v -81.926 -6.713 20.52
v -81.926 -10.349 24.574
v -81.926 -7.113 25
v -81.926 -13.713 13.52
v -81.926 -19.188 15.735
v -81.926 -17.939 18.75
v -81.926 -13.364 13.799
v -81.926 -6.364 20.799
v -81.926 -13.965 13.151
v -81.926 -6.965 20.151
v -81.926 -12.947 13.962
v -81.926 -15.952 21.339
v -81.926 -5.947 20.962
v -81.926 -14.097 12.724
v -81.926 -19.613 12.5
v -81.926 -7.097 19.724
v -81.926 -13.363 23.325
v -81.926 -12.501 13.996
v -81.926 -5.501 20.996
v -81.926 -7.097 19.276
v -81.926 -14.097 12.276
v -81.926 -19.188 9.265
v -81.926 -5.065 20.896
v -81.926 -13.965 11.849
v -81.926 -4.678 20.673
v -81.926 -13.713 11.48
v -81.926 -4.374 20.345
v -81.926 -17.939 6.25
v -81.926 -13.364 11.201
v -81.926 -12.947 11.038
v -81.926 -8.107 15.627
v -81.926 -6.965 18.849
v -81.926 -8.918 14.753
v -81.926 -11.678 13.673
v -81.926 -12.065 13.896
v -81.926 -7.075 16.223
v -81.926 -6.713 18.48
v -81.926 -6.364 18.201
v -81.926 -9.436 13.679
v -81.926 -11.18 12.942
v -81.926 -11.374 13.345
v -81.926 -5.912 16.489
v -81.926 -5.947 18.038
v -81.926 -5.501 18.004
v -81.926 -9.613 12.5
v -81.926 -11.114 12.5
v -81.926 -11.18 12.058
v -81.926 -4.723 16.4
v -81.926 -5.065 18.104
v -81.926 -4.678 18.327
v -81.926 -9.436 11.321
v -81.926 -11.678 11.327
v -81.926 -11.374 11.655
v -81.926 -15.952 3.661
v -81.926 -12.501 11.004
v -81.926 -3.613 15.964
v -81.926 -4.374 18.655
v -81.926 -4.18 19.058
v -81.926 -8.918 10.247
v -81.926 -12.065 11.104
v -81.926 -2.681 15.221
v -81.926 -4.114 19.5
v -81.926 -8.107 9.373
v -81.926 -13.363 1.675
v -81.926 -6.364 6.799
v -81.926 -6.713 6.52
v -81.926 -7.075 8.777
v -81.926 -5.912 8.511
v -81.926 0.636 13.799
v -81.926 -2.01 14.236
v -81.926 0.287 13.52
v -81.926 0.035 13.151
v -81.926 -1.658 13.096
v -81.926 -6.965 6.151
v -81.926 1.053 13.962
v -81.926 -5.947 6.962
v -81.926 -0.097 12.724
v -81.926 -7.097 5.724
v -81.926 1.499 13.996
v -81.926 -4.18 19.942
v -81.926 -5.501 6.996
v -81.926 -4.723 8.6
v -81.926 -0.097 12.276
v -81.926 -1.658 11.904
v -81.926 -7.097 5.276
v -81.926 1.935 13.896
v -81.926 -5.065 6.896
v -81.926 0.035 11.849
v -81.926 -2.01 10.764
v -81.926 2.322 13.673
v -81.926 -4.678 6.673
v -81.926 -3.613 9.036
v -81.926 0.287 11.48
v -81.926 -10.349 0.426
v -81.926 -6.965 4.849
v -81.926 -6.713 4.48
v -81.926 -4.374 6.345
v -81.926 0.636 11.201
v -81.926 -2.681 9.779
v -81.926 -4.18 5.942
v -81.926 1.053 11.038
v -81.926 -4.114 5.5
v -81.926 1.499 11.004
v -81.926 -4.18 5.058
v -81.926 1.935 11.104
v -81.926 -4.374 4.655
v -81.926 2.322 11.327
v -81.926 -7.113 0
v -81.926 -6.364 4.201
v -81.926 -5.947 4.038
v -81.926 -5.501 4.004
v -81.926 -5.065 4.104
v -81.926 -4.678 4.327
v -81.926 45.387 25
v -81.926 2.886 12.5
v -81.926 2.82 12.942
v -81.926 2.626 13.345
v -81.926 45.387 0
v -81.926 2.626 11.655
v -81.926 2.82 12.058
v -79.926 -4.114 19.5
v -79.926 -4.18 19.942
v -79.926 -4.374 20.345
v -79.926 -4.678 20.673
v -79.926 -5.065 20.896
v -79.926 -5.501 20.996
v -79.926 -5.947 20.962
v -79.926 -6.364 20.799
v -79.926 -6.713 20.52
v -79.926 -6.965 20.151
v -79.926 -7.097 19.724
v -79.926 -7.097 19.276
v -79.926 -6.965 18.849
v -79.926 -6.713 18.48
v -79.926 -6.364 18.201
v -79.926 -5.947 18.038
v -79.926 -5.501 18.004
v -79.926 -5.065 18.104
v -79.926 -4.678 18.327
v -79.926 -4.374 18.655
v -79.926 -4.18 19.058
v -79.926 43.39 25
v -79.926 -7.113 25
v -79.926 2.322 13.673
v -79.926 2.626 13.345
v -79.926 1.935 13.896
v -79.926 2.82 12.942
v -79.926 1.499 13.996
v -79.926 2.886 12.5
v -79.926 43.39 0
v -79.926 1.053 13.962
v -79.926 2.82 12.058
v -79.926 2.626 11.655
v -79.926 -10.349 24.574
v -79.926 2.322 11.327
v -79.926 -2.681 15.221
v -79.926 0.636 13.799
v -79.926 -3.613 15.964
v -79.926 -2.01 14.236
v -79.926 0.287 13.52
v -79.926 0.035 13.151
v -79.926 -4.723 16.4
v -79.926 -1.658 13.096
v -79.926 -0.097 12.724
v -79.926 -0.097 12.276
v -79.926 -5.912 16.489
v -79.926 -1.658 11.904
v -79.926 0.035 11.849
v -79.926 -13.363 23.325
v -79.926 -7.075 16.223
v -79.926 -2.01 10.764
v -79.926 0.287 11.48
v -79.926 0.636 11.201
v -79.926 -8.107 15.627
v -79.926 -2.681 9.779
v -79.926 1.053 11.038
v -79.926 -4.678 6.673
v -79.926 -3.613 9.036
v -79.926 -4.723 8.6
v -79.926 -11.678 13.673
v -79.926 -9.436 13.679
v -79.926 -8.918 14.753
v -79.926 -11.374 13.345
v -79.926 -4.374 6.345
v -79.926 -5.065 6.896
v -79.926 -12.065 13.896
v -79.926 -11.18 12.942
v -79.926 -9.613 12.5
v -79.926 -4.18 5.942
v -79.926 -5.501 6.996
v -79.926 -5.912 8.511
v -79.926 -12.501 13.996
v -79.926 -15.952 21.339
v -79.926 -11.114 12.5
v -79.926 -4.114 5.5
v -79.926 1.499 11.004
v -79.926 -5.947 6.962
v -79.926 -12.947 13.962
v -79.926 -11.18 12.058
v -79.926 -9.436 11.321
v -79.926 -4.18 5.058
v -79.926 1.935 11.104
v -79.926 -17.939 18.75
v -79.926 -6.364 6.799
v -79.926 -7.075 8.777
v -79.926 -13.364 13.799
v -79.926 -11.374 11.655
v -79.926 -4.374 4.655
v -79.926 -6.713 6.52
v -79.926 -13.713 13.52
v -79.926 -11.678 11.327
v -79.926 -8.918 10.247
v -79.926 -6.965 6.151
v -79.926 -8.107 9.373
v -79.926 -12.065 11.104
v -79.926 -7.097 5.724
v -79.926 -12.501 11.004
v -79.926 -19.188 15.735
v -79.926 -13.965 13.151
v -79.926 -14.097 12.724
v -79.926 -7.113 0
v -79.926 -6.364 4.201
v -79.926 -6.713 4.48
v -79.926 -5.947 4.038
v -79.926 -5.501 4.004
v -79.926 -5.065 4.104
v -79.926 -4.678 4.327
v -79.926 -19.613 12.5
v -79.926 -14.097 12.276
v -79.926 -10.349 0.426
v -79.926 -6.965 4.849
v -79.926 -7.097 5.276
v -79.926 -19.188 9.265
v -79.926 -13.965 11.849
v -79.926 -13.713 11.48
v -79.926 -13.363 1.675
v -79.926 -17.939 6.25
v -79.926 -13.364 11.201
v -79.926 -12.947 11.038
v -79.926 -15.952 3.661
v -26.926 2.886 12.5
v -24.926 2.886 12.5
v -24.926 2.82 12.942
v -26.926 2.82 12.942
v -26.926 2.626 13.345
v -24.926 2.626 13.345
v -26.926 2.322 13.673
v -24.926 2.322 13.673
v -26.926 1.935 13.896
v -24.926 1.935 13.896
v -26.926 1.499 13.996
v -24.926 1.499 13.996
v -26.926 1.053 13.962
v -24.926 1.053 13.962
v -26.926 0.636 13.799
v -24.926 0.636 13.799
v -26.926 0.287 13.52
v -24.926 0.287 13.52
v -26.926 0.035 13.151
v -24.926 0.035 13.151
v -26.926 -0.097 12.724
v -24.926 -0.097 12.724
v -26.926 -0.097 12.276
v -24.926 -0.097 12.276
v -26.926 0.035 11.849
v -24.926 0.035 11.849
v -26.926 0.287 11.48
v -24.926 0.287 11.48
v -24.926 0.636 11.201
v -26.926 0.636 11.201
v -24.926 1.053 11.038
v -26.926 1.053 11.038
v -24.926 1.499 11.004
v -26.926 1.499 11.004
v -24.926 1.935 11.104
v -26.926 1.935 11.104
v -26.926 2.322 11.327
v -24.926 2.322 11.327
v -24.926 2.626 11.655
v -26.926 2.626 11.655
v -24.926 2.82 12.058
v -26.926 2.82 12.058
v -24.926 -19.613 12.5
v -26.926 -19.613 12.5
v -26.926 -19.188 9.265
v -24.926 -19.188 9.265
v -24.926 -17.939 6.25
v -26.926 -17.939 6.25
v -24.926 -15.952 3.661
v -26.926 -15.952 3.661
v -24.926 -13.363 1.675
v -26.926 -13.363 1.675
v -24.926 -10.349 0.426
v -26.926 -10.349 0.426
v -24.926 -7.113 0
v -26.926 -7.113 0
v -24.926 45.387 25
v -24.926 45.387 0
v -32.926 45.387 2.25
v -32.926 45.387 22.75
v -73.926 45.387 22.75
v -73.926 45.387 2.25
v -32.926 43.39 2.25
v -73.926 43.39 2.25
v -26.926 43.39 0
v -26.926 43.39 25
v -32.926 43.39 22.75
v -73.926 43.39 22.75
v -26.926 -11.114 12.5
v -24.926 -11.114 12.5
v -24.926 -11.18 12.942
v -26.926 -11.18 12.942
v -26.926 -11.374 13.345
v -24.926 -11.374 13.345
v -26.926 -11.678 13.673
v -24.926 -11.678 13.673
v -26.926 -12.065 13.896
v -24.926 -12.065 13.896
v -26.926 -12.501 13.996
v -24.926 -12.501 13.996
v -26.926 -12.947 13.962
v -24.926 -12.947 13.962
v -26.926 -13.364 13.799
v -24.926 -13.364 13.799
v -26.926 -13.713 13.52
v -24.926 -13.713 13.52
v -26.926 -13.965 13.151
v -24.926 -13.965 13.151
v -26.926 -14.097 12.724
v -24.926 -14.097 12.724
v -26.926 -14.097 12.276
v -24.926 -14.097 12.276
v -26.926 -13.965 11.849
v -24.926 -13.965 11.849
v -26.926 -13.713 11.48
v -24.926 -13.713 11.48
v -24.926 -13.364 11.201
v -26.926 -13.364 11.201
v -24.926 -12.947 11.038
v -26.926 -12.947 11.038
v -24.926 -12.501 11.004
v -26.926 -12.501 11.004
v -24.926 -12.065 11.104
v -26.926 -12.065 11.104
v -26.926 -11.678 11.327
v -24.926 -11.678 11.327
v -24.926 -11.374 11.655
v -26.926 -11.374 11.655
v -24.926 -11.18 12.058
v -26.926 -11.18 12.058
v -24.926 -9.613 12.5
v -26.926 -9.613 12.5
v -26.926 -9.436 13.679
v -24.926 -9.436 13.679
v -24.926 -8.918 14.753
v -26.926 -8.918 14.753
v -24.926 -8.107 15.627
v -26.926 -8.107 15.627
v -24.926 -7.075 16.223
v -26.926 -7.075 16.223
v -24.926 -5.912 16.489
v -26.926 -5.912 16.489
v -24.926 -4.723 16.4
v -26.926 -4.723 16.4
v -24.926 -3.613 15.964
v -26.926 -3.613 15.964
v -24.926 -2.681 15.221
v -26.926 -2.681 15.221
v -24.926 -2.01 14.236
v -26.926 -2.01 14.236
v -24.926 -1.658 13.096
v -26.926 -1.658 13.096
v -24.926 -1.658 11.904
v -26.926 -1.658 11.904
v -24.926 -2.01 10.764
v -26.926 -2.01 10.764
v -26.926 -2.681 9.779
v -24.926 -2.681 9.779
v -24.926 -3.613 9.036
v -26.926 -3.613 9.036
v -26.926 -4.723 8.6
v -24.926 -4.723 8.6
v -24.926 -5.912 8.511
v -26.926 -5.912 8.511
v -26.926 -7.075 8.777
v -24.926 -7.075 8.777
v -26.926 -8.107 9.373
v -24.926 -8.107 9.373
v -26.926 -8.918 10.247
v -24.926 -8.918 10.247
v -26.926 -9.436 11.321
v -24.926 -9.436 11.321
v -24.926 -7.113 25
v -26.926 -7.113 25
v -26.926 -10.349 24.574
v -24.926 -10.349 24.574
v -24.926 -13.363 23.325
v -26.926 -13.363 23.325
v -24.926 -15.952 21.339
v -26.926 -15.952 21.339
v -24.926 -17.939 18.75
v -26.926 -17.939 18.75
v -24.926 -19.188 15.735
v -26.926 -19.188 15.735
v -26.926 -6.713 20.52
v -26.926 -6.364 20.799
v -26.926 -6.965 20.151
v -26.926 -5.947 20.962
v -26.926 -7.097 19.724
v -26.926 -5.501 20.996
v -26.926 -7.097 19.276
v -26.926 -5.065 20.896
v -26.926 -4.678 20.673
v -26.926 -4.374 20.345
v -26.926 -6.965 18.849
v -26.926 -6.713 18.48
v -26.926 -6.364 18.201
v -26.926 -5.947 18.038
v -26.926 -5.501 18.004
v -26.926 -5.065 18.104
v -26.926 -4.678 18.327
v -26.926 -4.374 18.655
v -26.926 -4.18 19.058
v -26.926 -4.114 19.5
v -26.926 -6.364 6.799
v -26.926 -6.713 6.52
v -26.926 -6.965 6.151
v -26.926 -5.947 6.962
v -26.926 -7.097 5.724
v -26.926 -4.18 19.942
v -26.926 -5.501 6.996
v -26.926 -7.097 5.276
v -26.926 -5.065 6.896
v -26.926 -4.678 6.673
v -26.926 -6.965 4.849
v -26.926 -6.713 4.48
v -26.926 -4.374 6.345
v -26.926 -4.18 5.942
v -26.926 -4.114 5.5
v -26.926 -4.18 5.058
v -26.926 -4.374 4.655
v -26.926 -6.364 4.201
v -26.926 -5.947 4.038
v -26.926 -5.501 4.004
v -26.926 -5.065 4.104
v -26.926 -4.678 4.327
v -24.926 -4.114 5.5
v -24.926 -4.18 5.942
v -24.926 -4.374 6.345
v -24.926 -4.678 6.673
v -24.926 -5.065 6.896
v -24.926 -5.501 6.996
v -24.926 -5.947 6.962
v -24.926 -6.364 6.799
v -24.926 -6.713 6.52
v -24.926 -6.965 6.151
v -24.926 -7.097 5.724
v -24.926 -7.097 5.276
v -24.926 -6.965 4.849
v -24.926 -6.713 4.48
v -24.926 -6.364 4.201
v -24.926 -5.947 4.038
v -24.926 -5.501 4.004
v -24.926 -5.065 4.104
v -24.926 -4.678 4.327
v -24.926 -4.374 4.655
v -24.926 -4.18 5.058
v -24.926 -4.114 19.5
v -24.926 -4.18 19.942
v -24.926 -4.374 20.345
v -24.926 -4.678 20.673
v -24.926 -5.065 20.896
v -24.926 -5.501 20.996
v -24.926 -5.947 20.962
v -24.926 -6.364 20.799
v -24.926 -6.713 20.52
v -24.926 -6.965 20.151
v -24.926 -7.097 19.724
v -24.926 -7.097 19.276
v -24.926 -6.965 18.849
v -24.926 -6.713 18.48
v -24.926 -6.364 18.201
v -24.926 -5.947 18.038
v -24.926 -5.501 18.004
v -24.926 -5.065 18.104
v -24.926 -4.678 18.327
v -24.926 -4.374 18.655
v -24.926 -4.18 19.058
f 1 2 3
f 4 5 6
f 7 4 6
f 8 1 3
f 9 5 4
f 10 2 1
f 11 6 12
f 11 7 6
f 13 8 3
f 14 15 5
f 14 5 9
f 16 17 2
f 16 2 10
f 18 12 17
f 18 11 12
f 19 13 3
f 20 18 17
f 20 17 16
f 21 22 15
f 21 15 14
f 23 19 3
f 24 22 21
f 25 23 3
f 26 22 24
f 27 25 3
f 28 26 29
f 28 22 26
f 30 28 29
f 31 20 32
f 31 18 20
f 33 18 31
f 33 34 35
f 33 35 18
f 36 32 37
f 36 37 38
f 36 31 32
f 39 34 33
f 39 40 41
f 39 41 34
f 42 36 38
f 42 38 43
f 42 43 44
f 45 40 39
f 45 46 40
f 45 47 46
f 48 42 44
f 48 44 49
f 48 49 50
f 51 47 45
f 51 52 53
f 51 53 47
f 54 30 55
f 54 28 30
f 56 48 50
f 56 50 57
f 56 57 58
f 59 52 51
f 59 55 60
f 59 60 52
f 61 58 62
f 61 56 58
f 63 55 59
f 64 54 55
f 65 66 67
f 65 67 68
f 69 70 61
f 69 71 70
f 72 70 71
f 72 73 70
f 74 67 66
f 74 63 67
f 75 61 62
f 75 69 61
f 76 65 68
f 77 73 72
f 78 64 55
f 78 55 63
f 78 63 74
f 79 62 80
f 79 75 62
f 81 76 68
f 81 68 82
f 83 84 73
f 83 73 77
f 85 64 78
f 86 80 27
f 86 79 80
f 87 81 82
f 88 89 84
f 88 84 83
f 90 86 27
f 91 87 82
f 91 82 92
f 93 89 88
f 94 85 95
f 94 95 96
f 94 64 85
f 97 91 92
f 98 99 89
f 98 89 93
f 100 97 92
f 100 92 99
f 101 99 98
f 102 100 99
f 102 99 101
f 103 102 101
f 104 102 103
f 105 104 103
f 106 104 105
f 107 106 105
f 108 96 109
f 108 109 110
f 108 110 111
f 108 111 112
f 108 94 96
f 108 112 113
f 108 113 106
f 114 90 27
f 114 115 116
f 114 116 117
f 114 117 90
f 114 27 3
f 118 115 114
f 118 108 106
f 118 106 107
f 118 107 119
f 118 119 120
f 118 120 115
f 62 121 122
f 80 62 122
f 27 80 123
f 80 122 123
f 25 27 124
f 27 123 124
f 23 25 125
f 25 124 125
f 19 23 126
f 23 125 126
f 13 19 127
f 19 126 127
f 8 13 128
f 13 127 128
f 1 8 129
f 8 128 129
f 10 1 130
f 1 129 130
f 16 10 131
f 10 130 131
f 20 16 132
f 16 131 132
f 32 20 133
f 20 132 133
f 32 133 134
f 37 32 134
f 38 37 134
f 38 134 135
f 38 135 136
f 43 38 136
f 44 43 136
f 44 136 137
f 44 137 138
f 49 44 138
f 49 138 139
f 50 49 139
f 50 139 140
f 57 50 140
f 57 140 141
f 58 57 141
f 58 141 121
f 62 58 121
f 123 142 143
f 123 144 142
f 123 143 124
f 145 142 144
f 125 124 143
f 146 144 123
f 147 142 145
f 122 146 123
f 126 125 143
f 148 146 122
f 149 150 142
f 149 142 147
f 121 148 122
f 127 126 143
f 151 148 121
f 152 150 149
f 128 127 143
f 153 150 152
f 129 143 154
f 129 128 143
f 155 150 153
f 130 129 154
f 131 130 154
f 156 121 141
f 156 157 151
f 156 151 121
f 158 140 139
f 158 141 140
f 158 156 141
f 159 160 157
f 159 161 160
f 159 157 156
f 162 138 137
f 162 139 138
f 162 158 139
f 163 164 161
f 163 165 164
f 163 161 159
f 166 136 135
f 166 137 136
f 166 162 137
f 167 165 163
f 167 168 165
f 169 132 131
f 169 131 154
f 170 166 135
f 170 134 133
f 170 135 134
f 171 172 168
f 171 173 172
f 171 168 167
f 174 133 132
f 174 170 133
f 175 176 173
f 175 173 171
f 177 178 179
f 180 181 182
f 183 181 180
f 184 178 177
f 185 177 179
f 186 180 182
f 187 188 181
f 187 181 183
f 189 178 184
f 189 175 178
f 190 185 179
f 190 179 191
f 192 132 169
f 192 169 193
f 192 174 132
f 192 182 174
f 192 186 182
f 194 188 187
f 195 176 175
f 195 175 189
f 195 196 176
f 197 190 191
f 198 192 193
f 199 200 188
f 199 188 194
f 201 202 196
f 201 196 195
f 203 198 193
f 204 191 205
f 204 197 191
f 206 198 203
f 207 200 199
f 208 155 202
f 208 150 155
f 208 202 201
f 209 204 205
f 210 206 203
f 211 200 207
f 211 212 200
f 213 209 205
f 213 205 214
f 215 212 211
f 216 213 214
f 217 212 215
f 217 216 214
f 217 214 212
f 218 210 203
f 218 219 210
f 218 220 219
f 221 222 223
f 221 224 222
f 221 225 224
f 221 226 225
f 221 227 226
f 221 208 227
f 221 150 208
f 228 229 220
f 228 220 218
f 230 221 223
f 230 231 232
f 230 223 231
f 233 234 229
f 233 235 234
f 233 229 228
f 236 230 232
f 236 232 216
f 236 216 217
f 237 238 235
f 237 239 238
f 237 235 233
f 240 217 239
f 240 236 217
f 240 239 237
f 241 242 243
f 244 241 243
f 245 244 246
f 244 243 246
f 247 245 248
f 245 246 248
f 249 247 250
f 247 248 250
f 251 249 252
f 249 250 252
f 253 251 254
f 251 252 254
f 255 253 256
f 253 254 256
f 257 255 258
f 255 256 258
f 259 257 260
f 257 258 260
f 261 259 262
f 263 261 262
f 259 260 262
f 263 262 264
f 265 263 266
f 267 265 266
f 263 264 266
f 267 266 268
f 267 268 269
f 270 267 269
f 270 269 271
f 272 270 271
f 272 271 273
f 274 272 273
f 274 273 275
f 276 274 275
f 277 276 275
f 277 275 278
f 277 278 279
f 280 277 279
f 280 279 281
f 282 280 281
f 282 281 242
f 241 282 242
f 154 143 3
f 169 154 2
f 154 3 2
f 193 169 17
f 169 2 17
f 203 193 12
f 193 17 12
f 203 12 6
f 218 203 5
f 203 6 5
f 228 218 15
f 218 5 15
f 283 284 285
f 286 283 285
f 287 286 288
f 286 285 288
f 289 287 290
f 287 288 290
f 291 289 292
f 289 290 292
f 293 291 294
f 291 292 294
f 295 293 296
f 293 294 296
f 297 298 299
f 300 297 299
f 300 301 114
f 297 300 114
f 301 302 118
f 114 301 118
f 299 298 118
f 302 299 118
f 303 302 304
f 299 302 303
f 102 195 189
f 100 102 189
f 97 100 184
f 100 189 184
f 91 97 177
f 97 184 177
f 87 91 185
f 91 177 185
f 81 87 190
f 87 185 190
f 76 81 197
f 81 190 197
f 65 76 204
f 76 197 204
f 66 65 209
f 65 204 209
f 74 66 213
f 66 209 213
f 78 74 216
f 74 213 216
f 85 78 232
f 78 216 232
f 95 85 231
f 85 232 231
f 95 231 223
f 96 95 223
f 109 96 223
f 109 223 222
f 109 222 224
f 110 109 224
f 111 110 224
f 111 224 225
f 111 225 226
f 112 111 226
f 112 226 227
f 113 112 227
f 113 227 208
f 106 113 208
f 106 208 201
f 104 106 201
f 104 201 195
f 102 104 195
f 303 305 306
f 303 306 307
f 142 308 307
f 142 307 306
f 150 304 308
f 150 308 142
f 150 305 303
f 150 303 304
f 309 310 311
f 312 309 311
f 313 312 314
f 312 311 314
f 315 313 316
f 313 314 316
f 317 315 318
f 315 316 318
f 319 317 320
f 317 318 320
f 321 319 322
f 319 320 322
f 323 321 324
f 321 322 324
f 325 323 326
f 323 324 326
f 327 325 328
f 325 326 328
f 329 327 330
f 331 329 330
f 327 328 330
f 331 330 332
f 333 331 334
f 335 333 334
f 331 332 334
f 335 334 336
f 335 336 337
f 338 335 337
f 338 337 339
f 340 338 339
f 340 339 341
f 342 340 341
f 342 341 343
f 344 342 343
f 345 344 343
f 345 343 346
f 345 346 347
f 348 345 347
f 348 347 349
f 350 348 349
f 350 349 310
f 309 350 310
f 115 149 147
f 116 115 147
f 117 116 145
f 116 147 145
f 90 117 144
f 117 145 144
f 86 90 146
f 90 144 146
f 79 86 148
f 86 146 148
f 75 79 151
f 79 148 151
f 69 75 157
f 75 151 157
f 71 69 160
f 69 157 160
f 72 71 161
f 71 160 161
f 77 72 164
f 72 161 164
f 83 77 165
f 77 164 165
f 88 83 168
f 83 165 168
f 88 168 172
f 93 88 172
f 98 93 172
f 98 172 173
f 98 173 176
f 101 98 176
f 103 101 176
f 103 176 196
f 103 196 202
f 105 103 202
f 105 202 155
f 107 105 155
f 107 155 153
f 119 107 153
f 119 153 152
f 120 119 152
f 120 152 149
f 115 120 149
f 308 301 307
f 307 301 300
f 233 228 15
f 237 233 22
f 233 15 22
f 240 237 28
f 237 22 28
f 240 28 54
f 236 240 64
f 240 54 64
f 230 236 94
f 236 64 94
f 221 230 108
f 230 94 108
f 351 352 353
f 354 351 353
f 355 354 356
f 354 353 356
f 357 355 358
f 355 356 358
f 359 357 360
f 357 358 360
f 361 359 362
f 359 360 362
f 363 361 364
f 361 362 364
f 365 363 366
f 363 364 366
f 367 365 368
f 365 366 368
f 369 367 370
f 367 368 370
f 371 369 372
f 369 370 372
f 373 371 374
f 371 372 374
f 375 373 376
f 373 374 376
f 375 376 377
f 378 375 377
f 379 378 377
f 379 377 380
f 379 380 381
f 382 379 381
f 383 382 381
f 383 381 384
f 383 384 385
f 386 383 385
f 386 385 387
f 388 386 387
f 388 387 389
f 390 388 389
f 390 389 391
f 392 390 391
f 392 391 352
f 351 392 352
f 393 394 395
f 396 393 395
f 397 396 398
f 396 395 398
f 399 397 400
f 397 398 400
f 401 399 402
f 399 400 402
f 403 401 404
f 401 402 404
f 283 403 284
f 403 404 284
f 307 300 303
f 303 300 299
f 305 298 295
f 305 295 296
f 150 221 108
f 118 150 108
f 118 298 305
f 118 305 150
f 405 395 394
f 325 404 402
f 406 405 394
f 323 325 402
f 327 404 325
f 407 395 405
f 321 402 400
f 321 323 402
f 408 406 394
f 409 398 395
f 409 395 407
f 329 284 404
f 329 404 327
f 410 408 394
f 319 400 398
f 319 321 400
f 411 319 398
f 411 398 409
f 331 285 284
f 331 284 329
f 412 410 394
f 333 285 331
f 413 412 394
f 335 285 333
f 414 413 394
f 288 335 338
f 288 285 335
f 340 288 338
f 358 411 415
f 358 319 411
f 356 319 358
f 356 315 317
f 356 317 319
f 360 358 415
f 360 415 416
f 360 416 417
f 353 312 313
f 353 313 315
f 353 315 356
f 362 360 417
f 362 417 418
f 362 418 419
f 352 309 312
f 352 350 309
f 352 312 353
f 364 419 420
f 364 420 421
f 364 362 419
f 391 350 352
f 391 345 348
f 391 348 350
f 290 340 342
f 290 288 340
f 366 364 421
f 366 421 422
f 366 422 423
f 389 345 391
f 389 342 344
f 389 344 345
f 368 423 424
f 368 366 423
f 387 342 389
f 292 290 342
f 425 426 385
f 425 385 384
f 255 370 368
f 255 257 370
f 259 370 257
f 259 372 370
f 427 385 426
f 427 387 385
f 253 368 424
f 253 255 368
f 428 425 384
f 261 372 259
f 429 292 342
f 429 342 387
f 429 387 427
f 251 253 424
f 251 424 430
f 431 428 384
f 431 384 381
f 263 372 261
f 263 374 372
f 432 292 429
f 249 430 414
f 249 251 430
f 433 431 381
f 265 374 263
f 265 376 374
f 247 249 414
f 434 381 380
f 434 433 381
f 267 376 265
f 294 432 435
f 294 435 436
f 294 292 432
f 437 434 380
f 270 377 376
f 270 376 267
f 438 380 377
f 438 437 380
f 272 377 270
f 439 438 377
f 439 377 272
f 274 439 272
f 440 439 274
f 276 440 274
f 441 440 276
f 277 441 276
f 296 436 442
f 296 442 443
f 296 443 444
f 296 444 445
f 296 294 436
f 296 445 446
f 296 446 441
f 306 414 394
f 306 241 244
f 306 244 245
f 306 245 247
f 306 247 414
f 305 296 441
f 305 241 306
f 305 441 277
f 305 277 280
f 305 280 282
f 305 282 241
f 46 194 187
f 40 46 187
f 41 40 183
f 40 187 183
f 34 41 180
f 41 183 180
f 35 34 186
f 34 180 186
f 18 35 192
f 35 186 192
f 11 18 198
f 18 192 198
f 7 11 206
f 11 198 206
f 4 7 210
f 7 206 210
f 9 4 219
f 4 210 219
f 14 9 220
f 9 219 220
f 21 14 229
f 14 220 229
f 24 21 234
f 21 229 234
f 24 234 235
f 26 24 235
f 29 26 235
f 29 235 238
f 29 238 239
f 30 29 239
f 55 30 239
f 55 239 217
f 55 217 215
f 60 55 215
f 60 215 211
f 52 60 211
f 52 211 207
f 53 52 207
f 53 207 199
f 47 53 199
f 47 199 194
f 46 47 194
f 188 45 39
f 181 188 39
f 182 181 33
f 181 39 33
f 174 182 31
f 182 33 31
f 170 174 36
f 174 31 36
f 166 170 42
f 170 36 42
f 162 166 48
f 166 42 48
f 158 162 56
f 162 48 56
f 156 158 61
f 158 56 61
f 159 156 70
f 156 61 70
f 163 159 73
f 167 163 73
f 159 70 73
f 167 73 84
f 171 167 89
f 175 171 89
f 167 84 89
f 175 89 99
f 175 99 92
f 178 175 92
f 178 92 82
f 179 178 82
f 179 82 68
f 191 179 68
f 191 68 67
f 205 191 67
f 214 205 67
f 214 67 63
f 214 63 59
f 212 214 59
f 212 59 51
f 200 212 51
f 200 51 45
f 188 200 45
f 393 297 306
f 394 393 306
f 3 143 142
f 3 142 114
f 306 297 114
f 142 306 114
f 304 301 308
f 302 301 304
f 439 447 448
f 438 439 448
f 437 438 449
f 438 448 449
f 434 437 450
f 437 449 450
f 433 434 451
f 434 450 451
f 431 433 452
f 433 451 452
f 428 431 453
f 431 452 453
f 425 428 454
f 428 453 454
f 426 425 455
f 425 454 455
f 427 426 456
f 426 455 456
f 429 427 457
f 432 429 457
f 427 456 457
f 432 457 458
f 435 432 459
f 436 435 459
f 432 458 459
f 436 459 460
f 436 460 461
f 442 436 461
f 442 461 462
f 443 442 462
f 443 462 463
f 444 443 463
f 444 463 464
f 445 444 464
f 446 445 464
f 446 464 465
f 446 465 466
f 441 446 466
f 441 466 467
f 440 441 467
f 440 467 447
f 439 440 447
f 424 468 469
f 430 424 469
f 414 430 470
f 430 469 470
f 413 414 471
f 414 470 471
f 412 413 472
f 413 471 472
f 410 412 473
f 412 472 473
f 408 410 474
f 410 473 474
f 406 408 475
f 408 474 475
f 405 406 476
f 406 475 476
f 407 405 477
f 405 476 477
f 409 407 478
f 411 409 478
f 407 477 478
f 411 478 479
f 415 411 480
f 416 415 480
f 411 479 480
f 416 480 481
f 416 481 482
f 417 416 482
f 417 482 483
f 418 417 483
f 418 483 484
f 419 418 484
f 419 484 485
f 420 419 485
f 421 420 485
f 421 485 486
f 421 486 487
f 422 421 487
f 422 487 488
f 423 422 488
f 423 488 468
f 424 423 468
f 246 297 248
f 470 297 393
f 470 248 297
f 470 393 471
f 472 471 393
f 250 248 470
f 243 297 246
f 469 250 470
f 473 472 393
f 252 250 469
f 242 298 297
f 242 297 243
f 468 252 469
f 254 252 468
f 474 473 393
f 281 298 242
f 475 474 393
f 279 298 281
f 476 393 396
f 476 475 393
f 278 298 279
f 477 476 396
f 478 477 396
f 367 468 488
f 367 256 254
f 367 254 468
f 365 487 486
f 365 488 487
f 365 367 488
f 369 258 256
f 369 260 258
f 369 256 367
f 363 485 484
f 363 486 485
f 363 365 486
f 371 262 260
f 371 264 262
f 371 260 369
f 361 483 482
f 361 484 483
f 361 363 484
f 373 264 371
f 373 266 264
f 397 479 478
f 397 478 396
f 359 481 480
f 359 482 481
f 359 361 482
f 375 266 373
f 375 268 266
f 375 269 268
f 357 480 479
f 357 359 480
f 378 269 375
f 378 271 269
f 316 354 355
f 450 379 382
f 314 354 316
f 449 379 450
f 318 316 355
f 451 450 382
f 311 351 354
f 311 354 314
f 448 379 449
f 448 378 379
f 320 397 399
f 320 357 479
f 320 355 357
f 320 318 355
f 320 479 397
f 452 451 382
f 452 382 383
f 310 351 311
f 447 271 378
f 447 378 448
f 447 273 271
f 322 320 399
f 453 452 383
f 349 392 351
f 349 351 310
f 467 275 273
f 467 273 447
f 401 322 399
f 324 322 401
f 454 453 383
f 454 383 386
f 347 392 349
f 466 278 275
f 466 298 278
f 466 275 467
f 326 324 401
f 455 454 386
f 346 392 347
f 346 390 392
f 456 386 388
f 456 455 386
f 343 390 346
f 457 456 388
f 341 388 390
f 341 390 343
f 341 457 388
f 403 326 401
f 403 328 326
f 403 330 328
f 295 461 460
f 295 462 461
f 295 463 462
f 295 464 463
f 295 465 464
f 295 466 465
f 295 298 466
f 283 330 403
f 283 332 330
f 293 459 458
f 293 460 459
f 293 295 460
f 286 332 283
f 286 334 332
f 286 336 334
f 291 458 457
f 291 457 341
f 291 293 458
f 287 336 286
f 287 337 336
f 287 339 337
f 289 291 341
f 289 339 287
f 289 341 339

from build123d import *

# Parameters (mm, degrees)
BOSS_EXTRUDE2_DEPTH   = 25
SKETCH6_R             = 4
CUT_EXTRUDE2_DEPTH    = 78.032036302
CUT_EXTRUDE3_DEPTH    = 78.032036302
SKETCH9_R             = 1.5
CUT_EXTRUDE4_DEPTH    = 78.032036302
CROQUIS2_W            = 41
CROQUIS2_H            = 20.5
CORTAR_EXTRUIR1_DEPTH = 10


with BuildPart() as part:
    # Sketch3 → Boss-Extrude2 (new body)
    with BuildSketch(Plane.XY):
        Polygon((-79.925523148, 45.386502584), (-27.042967192, 45.386502584), (-24.925523148, 45.386502584), (-24.925523148, -19.613497416), (-26.925523148, -19.613497416), (-26.925523148, 43.389953837), (-79.925523148, 43.389953837), (-79.925523148, -19.613497416), (-81.925523148, -19.613497416), (-81.925523148, 45.386502584), align=None)
    extrude(amount=BOSS_EXTRUDE2_DEPTH)

    # Sketch6 → Cut-Extrude2 (cut, through all)
    with BuildSketch(Plane.ZY.offset(81.925523148)):
        with Locations(Location((12.5, -5.613497416, 0), (0, 0, 270))):
            Circle(SKETCH6_R)
    extrude(amount=-CUT_EXTRUDE2_DEPTH, mode=Mode.SUBTRACT)

    # Sketch8 → Cut-Extrude3 (cut, through all)
    with BuildSketch(Plane.ZY.offset(81.925523148)):
        with BuildLine():
            Line((0, -19.613497416), (12.5, -19.613497416))
            ThreePointArc((12.5, -19.613497416), (3.661165213, -15.952332159), (0, -7.113497352))
            Line((0, -7.113497352), (0, -19.613497416))
        make_face()
        with BuildLine():
            Line((12.5, -19.613497416), (25, -19.613497416))
            Line((25, -19.613497416), (25, -7.113497416))
            ThreePointArc((25, -7.113497416), (21.338834765, -15.952332181), (12.5, -19.613497416))
        make_face()
    extrude(amount=-CUT_EXTRUDE3_DEPTH, mode=Mode.SUBTRACT)

    # Sketch9 → Cut-Extrude4 (cut, through all)
    with BuildSketch(Plane(origin=(-24.925523148, 0, 0), x_dir=(0, 0, -1), z_dir=(1, 0, 0))):
        with Locations(Location((-12.500000994, 1.386498436, 0), (0, 0, 90))):
            Circle(SKETCH9_R)
        with Locations(Location((-5.500000994, -5.613501564, 0), (0, 0, 90))):
            Circle(SKETCH9_R)
        with Locations(Location((-12.500000994, -12.613501564, 0), (0, 0, 90))):
            Circle(SKETCH9_R)
        with Locations(Location((-19.500000994, -5.613501564, 0), (0, 0, 90))):
            Circle(SKETCH9_R)
    extrude(amount=-CUT_EXTRUDE4_DEPTH, mode=Mode.SUBTRACT)

    # Croquis2 → Cortar-Extruir1 (cut)
    with BuildSketch(Plane(origin=(0, 45.386502584, 0), x_dir=(1, 0, 0), z_dir=(0, 1, 0))):
        with Locations((-53.425523148, -12.5)):
            Rectangle(CROQUIS2_W, CROQUIS2_H)
    extrude(amount=-CORTAR_EXTRUIR1_DEPTH, mode=Mode.SUBTRACT)


solid = part.part
